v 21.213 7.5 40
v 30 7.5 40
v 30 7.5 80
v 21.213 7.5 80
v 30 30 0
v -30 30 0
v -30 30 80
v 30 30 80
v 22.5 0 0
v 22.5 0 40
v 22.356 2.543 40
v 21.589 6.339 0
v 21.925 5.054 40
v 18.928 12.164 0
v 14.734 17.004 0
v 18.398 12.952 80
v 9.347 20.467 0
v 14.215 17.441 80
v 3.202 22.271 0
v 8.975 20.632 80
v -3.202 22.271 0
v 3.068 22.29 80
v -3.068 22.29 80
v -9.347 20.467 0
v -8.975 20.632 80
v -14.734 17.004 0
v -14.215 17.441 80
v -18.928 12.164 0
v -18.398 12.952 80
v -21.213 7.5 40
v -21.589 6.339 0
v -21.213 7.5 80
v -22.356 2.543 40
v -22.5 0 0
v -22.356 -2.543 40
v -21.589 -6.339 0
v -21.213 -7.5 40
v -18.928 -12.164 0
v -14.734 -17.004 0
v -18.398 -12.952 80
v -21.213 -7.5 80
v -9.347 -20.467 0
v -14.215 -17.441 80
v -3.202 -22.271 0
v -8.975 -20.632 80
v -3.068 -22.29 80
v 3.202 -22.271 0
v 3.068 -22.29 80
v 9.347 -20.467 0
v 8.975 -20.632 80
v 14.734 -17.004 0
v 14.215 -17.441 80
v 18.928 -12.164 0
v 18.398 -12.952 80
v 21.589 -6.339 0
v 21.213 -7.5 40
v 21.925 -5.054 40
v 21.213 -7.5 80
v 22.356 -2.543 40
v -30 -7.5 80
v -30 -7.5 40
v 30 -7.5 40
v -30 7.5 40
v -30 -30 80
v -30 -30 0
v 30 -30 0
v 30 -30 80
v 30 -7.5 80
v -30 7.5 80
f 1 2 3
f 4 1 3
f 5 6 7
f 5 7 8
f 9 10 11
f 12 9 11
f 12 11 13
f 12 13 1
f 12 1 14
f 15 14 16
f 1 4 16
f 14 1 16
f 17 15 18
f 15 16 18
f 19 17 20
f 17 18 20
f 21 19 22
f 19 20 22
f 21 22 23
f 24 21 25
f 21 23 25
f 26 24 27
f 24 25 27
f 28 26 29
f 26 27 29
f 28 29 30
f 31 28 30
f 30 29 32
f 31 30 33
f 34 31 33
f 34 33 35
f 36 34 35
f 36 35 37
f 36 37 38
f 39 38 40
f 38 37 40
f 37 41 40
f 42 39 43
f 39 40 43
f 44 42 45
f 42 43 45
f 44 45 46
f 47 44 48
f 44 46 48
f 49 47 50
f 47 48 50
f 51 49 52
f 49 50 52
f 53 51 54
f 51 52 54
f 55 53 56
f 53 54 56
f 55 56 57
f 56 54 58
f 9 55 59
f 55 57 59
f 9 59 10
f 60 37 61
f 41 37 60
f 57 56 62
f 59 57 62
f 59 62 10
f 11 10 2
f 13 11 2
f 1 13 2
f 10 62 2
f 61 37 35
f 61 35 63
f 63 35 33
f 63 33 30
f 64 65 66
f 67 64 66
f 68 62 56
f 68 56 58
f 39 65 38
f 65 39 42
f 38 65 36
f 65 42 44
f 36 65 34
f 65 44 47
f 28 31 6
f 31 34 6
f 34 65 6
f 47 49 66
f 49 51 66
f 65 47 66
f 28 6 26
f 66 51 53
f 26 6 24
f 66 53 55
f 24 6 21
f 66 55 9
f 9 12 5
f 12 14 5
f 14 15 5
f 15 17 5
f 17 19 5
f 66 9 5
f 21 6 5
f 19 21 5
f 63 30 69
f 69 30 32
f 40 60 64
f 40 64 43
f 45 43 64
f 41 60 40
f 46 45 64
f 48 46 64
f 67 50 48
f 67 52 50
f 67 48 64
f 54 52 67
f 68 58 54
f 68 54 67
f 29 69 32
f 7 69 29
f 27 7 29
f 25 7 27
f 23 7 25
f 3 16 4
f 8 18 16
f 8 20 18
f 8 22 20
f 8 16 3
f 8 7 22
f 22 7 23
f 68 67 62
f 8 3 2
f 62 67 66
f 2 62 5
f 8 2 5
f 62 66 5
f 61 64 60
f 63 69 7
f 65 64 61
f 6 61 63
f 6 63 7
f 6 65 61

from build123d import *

# Parameters (mm, degrees)
F0_W     = 60
F0_H     = 60
F1_DEPTH = 80
F2_R     = 22.5
F3_DEPTH = 80
F4_W     = 15
F4_H     = 40
F5_DEPTH = 60


with BuildPart() as f1:
    # F0 (on Top) → F1 (new body)
    with BuildSketch(Plane.XY):
        Rectangle(F0_W, F0_H)
    extrude(amount=F1_DEPTH)

    # F2 (on face) → F3 (cut)
    with BuildSketch(Plane.XY.offset(80)):
        Circle(F2_R)
    extrude(amount=-F3_DEPTH, mode=Mode.SUBTRACT)

    # F4 (on face) → F5 (cut)
    with BuildSketch(Plane.YZ.offset(30)):
        with Locations((0, 60)):
            Rectangle(F4_W, F4_H)
    extrude(amount=-F5_DEPTH, mode=Mode.SUBTRACT)


solid = f1.part
